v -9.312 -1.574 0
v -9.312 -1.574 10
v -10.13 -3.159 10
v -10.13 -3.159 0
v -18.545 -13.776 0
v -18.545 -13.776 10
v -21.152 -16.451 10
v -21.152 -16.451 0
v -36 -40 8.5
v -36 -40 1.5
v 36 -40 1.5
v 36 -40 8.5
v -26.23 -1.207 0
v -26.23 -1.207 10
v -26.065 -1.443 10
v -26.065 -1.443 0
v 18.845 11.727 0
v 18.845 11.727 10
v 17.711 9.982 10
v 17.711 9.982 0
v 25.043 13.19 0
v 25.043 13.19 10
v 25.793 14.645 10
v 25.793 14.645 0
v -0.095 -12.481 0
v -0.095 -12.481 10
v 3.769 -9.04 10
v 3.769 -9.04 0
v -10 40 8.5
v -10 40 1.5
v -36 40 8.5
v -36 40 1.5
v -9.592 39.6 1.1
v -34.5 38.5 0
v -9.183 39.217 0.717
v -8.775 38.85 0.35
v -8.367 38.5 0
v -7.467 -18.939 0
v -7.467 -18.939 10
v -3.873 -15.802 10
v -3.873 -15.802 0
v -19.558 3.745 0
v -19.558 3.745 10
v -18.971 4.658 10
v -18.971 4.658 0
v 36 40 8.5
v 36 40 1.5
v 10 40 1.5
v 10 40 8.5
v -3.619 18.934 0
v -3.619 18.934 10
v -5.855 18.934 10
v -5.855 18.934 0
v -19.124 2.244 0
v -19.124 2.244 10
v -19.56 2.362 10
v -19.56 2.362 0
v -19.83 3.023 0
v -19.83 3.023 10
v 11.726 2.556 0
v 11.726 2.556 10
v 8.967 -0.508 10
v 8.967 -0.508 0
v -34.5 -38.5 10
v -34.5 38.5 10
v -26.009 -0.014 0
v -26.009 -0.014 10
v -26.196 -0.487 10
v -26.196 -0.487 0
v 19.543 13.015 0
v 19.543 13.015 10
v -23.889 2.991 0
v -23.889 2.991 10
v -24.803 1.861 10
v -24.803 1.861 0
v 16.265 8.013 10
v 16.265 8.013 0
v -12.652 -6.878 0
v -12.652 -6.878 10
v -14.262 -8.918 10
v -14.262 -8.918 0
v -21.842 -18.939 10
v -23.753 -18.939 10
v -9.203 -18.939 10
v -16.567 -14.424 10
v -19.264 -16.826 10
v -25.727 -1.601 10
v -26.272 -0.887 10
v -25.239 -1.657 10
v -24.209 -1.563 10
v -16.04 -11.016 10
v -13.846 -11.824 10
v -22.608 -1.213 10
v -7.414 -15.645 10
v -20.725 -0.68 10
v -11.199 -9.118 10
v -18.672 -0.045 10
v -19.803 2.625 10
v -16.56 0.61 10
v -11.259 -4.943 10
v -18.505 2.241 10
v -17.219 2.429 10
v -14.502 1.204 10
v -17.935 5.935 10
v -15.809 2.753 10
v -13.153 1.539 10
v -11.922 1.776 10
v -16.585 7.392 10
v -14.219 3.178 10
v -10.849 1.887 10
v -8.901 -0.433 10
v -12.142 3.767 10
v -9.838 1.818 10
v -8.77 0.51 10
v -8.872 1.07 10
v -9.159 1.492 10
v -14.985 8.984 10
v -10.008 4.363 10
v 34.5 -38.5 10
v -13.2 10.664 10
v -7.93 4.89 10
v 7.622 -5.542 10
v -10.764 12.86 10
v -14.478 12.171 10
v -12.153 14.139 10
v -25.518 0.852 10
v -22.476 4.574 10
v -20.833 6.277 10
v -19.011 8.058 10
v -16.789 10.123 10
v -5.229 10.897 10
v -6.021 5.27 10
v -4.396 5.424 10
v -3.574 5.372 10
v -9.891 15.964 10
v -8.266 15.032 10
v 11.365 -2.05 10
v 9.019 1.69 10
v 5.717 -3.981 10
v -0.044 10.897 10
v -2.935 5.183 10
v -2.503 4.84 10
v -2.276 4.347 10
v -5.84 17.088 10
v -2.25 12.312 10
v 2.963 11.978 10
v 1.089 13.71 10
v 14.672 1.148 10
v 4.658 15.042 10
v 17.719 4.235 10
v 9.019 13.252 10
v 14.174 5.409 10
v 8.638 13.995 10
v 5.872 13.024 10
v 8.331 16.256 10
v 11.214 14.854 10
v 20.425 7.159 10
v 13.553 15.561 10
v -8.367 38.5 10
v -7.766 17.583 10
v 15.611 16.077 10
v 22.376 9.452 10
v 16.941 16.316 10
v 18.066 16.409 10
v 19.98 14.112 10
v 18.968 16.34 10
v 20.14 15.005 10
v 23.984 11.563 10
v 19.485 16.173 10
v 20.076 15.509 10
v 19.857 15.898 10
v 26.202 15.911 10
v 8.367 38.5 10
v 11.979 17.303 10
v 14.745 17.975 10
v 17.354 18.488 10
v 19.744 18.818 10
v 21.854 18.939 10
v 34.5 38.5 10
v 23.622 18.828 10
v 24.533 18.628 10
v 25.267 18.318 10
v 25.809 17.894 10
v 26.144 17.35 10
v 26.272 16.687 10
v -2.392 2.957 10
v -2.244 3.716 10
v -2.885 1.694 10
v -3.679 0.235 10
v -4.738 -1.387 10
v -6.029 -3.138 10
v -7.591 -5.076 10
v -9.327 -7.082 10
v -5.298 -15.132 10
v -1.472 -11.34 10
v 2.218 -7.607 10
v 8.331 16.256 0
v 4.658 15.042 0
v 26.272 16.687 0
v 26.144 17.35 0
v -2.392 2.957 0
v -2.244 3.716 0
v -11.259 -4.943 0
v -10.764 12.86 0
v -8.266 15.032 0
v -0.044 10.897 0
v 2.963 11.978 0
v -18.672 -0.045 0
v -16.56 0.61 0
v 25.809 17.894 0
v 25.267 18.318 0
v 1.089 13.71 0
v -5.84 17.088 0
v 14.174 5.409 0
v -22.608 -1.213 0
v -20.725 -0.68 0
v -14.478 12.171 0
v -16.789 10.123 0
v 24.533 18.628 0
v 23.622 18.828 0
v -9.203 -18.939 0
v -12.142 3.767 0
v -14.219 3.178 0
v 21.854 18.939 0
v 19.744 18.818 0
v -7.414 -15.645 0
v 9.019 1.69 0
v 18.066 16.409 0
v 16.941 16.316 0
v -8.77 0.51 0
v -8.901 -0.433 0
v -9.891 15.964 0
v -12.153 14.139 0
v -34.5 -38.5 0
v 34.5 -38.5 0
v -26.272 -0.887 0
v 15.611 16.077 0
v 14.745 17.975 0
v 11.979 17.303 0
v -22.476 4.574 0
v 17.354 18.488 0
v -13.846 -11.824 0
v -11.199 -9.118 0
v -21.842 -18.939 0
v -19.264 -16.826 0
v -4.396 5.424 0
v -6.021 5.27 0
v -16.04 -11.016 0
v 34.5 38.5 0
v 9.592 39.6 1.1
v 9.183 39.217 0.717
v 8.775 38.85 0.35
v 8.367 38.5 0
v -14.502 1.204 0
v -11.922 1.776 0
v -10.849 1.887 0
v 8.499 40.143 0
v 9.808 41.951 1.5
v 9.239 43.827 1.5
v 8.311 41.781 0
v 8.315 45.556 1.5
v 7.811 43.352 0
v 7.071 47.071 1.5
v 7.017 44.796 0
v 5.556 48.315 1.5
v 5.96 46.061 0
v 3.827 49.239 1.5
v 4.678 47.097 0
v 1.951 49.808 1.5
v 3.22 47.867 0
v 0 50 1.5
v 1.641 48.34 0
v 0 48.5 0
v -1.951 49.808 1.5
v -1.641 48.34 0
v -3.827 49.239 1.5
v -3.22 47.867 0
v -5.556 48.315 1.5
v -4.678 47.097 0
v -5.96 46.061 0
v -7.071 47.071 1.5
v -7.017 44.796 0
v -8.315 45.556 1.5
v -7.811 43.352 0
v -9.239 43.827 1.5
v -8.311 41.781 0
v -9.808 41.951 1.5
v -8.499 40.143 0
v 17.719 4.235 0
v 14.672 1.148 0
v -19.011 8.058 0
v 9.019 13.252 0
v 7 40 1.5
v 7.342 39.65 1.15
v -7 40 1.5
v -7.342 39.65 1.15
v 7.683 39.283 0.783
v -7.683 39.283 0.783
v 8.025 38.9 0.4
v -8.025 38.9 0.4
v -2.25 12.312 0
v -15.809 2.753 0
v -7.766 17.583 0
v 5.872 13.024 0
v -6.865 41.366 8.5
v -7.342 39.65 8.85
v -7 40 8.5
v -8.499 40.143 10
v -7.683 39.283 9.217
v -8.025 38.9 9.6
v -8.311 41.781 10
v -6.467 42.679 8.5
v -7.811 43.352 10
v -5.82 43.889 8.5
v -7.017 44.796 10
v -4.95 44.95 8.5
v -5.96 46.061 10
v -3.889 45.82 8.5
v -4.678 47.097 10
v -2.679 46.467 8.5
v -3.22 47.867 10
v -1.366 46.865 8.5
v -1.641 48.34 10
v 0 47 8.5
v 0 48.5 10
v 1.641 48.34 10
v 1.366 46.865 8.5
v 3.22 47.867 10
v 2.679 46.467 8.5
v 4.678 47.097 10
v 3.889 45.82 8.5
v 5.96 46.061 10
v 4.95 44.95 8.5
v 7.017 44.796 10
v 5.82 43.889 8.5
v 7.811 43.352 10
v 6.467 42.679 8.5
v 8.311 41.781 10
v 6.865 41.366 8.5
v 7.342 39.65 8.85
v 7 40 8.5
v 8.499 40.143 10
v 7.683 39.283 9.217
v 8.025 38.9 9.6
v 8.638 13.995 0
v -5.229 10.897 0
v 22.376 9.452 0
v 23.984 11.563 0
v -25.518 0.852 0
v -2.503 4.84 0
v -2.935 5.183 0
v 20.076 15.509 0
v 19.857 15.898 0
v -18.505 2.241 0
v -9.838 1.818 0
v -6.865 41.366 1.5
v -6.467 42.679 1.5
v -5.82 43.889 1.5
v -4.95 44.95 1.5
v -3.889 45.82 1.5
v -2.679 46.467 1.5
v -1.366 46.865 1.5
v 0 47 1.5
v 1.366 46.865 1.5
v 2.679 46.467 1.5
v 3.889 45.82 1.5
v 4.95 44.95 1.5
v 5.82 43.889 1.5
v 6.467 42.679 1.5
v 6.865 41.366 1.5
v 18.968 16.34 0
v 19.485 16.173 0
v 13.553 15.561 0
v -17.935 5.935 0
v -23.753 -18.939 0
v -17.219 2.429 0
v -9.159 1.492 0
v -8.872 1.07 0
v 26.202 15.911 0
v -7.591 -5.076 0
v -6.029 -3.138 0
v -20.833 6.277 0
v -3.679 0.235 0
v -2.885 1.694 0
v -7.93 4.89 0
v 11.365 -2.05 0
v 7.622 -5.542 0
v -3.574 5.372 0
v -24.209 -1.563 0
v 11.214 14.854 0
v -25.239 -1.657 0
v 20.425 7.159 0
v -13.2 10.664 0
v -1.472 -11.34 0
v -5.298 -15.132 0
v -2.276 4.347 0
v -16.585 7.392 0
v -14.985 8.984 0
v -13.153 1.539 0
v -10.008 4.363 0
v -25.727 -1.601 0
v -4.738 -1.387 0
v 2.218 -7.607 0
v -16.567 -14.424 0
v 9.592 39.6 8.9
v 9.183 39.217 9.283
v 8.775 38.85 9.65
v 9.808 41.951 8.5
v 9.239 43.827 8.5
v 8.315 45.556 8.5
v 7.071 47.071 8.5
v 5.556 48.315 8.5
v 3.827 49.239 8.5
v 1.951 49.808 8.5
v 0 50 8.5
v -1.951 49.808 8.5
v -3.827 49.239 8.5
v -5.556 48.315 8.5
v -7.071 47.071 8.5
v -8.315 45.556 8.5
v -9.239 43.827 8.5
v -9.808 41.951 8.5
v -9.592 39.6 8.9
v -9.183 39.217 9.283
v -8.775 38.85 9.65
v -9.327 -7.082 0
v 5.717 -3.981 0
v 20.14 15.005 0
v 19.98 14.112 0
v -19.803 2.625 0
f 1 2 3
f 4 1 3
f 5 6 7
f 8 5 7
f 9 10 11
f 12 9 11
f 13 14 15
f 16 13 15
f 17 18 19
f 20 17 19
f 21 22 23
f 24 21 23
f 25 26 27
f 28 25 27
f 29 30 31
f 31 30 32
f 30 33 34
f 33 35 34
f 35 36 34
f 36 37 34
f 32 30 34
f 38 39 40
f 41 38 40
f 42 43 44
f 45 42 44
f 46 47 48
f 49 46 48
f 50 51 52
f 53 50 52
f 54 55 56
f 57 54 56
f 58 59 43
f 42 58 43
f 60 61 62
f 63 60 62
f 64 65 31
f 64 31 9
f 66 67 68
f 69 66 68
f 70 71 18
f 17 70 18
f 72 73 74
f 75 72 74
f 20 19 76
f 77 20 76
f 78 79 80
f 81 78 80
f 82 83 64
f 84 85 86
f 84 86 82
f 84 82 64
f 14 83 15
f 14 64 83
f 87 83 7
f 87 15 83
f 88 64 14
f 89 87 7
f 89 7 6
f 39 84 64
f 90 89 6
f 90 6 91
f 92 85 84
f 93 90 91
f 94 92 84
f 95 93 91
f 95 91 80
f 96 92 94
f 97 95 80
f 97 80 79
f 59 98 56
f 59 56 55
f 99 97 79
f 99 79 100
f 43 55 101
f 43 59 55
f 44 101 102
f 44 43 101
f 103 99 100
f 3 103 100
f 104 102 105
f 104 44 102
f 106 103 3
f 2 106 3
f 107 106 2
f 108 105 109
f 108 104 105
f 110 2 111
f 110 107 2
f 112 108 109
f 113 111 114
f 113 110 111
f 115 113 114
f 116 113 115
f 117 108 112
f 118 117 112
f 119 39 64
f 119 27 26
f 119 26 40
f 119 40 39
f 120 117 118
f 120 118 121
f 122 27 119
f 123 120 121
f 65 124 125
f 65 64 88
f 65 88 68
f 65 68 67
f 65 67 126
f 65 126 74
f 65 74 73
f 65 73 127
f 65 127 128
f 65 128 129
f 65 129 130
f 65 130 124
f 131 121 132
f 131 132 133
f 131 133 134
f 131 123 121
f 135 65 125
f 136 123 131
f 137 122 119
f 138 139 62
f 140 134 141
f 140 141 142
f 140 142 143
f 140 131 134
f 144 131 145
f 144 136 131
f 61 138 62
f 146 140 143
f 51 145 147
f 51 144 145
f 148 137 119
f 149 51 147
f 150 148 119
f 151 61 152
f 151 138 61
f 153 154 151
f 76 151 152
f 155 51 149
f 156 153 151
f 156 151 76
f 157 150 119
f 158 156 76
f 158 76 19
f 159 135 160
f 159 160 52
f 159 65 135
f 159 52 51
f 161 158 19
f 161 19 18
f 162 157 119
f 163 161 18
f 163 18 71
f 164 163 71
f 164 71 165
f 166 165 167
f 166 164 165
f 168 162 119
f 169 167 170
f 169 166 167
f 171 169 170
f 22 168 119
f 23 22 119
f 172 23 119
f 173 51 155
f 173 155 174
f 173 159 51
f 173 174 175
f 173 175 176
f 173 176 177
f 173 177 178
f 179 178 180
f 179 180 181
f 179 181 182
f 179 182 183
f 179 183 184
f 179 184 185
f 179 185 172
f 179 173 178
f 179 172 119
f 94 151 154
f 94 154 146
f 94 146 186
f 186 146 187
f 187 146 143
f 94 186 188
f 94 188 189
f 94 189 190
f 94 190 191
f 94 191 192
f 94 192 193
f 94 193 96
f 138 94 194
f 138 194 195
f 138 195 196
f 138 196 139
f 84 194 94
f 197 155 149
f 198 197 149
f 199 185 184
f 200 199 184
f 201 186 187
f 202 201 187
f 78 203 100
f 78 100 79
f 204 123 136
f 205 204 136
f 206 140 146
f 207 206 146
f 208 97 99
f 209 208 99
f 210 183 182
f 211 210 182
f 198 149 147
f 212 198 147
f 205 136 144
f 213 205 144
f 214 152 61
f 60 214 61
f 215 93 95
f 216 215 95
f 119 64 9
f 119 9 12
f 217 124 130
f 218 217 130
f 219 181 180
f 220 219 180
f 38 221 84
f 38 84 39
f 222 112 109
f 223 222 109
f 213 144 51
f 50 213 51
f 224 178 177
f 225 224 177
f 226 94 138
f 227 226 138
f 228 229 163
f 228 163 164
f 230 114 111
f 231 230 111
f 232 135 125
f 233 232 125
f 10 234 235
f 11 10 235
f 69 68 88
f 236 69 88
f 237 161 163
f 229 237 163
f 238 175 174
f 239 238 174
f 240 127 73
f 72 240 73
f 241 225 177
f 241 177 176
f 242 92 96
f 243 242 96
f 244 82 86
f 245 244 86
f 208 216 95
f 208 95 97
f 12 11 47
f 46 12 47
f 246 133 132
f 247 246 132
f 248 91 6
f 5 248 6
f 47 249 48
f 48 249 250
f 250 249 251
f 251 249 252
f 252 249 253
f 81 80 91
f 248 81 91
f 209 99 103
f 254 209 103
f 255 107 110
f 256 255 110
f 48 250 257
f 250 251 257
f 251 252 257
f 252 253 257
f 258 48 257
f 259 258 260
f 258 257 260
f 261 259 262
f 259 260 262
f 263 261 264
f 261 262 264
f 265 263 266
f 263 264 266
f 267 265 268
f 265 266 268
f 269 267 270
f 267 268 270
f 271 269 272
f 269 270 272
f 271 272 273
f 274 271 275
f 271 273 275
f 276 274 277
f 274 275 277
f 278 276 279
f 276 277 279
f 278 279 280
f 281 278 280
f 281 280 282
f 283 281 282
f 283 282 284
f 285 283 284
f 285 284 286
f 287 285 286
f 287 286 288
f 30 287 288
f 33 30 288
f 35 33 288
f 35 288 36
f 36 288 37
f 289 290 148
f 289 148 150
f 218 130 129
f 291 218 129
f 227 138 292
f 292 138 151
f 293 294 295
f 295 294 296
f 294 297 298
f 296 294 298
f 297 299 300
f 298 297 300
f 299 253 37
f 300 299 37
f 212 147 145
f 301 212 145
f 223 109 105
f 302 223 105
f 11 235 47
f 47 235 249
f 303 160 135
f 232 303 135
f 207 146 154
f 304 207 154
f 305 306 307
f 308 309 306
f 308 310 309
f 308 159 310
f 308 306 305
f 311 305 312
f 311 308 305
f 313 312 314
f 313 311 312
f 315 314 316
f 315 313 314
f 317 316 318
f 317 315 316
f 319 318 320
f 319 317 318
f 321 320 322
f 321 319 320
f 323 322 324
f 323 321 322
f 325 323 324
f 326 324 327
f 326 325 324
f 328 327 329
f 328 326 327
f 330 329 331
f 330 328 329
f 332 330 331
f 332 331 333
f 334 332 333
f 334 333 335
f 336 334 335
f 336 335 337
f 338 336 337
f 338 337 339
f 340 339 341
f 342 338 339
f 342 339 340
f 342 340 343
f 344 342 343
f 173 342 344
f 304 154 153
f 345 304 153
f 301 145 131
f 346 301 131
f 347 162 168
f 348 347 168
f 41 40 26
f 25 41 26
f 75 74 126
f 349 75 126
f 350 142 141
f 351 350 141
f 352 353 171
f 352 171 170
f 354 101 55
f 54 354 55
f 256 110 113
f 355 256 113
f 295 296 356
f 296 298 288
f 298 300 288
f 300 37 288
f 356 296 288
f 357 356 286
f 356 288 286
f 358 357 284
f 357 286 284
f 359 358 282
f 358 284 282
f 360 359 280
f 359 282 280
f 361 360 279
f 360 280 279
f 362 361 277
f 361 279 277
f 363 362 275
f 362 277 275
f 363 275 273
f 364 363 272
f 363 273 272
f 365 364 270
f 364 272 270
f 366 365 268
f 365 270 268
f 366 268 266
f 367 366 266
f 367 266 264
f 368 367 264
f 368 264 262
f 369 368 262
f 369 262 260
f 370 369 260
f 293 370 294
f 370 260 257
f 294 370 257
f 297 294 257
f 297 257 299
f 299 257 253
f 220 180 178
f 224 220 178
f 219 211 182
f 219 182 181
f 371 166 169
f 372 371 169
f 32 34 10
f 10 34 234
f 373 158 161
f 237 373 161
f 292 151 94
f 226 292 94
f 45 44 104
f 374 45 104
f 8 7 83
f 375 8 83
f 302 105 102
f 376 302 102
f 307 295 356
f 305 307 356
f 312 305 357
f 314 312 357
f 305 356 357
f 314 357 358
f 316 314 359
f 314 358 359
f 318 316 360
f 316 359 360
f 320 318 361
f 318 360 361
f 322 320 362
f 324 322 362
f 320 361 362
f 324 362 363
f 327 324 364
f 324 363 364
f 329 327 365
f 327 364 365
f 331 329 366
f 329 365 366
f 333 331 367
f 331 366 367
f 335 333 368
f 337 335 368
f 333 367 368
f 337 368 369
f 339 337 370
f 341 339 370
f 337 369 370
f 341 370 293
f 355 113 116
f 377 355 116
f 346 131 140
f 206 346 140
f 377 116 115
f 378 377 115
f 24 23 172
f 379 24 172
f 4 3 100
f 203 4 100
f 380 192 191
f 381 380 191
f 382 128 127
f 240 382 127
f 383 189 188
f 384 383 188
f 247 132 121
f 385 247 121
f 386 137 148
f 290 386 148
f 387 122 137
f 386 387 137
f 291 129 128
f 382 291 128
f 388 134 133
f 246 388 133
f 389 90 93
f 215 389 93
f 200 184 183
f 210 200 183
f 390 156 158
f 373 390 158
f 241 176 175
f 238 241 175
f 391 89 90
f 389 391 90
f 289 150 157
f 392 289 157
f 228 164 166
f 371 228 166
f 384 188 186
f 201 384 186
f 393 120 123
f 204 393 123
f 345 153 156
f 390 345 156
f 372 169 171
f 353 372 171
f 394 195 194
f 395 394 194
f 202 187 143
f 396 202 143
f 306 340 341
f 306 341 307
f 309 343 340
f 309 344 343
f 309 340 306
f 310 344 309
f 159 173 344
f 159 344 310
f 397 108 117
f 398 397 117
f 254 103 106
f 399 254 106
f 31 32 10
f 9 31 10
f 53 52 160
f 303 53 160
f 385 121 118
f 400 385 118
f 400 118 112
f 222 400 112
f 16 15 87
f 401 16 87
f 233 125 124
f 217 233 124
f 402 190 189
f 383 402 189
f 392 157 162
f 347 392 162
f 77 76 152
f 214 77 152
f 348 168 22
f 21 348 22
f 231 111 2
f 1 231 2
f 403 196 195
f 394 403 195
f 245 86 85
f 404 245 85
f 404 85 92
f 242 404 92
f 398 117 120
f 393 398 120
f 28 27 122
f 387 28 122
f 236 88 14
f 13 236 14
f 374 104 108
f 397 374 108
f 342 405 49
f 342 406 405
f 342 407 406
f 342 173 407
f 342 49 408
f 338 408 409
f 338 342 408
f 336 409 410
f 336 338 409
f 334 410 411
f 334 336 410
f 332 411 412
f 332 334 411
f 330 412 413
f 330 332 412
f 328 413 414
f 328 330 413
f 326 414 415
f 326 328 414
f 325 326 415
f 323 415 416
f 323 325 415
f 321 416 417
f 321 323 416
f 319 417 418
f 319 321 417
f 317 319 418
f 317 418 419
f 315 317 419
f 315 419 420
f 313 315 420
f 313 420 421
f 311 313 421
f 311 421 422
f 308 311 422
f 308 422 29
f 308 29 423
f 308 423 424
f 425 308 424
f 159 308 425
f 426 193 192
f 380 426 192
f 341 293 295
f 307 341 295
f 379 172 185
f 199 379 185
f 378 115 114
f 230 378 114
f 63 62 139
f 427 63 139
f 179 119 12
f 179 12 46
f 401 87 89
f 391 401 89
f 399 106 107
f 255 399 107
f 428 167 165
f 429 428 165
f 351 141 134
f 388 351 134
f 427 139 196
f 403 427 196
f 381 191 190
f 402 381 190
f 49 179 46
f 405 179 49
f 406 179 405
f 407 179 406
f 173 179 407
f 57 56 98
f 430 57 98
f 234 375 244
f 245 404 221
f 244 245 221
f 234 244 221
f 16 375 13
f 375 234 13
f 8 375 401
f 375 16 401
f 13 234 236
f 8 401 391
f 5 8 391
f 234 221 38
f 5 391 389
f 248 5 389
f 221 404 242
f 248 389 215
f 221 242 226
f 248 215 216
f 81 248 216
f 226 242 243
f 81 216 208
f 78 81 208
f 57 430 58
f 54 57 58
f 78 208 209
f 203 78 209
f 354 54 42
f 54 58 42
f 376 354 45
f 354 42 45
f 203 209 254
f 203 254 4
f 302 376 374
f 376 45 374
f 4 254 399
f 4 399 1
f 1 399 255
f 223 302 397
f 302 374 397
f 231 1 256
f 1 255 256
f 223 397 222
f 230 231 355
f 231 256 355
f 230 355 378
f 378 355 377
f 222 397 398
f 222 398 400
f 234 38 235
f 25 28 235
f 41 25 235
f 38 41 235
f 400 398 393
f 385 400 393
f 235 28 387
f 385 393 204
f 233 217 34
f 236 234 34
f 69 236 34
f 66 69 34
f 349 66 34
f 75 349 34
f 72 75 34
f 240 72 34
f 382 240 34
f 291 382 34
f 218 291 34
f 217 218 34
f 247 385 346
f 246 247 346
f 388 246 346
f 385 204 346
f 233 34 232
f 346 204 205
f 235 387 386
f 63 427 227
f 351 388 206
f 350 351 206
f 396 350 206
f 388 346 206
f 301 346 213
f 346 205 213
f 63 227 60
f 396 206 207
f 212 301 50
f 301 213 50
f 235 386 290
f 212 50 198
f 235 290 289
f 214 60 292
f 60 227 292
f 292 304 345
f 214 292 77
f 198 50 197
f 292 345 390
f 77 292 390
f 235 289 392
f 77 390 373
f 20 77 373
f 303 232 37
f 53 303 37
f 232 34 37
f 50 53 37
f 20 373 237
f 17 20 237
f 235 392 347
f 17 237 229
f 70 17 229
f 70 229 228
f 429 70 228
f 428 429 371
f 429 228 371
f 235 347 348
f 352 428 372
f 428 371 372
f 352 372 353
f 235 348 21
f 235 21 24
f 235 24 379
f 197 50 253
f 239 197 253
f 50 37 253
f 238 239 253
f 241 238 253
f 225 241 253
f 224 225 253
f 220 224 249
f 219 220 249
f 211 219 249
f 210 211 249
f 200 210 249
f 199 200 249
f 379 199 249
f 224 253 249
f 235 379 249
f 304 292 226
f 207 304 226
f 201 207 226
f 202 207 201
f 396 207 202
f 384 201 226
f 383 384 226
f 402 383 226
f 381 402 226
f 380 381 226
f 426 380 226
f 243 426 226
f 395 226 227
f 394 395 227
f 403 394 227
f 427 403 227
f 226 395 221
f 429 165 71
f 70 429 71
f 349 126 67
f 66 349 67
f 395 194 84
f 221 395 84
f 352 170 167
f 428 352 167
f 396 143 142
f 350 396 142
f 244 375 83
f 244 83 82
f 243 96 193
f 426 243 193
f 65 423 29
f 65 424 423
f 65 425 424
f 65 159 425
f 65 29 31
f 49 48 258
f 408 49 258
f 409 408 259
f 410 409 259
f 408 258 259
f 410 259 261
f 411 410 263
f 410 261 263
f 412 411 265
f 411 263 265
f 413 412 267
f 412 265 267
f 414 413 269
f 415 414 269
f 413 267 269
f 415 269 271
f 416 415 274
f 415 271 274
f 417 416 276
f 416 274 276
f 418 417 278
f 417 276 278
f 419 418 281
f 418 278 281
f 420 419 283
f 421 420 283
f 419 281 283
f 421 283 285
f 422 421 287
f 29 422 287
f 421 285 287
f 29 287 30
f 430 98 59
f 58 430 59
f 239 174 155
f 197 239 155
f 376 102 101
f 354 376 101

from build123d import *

# Parameters (mm, degrees)
F1_DEPTH = 10
F2_SIZE  = 1.49999
F4_DEPTH = 10


# Not quite as in the source:
# - a fillet or chamfer is up to 0.001 mm smaller than in the source, because OpenCascade refuses the exact size


with BuildPart() as f1:
    # F0 (on Top) → F1 (new body)
    with BuildSketch(Plane.XY):
        with BuildLine():
            Line((7.0000007749, 40), (10, 40))
            ThreePointArc((10, 40), (0, 50), (-10, 40))
            Line((-10, 40), (-7.0000007749, 40))
            ThreePointArc((-7.0000007749, 40), (0, 47.0000007749), (7.0000007749, 40))
        make_face()
        Polygon((36, -40), (36, 40), (10, 40), (7.0000007749, 40), (-7.0000007749, 40), (-10, 40), (-36, 40), (-36, -40), align=None)
    extrude(amount=F1_DEPTH)

    # F2 (size 1.5 in the source; OpenCascade refuses exactly that, so slightly less here)
    f2_edges = [f1.edges().sort_by_distance(p)[0] for p in [
        (0, 50, 10),
        (-23, 40, 10),
        (-36, 0, 10),
        (0, -40, 10),
        (36, 0, 10),
        (23, 40, 10),
        (0, 47.000001, 10),
        (0, 40, 10),
        (0, 50, 0),
        (-23, 40, 0),
        (-36, 0, 0),
        (0, -40, 0),
        (36, 0, 0),
        (23, 40, 0),
        (0, 47.000001, 0),
        (0, 40, 0),
    ]]
    chamfer(f2_edges, length=F2_SIZE)

    # F3 (on face) → F4 (cut)
    with BuildSketch(Plane.XY.offset(10)):
        Polygon((9.01941, 13.251642), (-7.413878, -15.645048), (9.01941, 1.689704), align=None)
        Polygon((-5.229314, 10.897392), (-0.043674, 10.897392), (2.962569, 11.978135), (5.871741, 13.023694), (8.637504, 13.995209), (11.213521, 14.853819), (13.553455, 15.560666), (15.610967, 16.076888), (16.940888, 16.315581), (18.066333, 16.408794), (18.967754, 16.340134), (19.485045, 16.172547), (19.857078, 15.897769), (20.075875, 15.509104), (20.140122, 15.005391), (19.980223, 14.112285), (19.543063, 13.014817), (18.845257, 11.726576), (17.710823, 9.98186), (16.264623, 8.013275), (14.174175, 5.408678), (11.72632, 2.555867), (8.966951, -0.507624), (5.716937, -3.981084), (2.218444, -7.607146), (-1.472083, -11.339644), (-5.298199, -15.132416), (-9.20346, -18.939297), (-7.467058, -18.939297), (-3.873072, -15.801826), (-0.094887, -12.481081), (3.769463, -9.040146), (7.621943, -5.542107), (11.36452, -2.050048), (14.671952, 1.148161), (17.718542, 4.234917), (20.424586, 7.15893), (22.376178, 9.451811), (23.983998, 11.56327), (25.043446, 13.189903), (25.792536, 14.645471), (26.202411, 15.911404), (26.271608, 16.686717), (26.143923, 17.349851), (25.809161, 17.894215), (25.267338, 18.318258), (24.53297, 18.627591), (23.621676, 18.82837), (21.854292, 18.939297), (19.744262, 18.817766), (17.353663, 18.488244), (14.744575, 17.975197), (11.979075, 17.30309), (8.331078, 16.256236), (4.658259, 15.041801), (1.0886, 13.710223), (-2.249918, 12.31194), align=None)
        Polygon((-5.840144, 17.088177), (-3.619251, 18.933561), (-5.855152, 18.933561), (-7.766318, 17.582905), (-9.890915, 15.963704), (-12.153333, 14.1388), (-14.477963, 12.171034), (-16.789194, 10.123247), (-19.011419, 8.058281), (-20.833308, 6.276802), (-22.476192, 4.573508), (-23.888546, 2.991223), (-24.802964, 1.860788), (-25.518263, 0.852267), (-26.00945, -0.013567), (-26.195816, -0.487065), (-26.271609, -0.886829), (-26.230101, -1.207268), (-26.064565, -1.442791), (-25.726944, -1.601419), (-25.239428, -1.656759), (-24.209316, -1.56342), (-22.607846, -1.213122), (-20.724778, -0.679711), (-18.671706, -0.044733), (-16.560227, 0.610268), (-14.501933, 1.203748), (-13.152533, 1.53891), (-11.922154, 1.776), (-10.849071, 1.887047), (-9.838371, 1.818066), (-9.158572, 1.492121), (-8.872137, 1.070319), (-8.770299, 0.510027), (-8.901347, -0.43259), (-9.311798, -1.573728), (-10.129528, -3.159215), (-11.258734, -4.942681), (-12.651899, -6.877665), (-14.261505, -8.917703), (-16.040031, -11.016334), (-18.545222, -13.775636), (-21.151889, -16.451403), (-23.753323, -18.939297), (-21.841571, -18.939297), (-19.26416, -16.826499), (-16.566892, -14.424306), (-13.846275, -11.824217), (-11.198816, -9.11773), (-9.327369, -7.082132), (-7.590687, -5.076318), (-6.028942, -3.138376), (-4.738285, -1.386829), (-3.678568, 0.235044), (-2.884733, 1.694116), (-2.391719, 2.957258), (-2.24357, 3.715625), (-2.276453, 4.347186), (-2.5028, 4.840154), (-2.934991, 5.182783), (-3.574073, 5.372), (-4.395773, 5.424114), (-6.021186, 5.269587), (-7.929695, 4.890115), (-10.007823, 4.363257), (-12.142089, 3.766577), (-14.219015, 3.177635), (-15.808866, 2.752566), (-17.218733, 2.429106), (-18.505432, 2.241234), (-19.124111, 2.244482), (-19.559671, 2.362015), (-19.803219, 2.624939), (-19.830168, 3.023301), (-19.558342, 3.744641), (-18.971466, 4.657578), (-17.935128, 5.935143), (-16.584765, 7.39239), (-14.985004, 8.983921), (-13.200474, 10.664336), (-10.763992, 12.85997), (-8.266136, 15.032448), align=None)
    extrude(amount=-F4_DEPTH, mode=Mode.SUBTRACT)


solid = f1.part
